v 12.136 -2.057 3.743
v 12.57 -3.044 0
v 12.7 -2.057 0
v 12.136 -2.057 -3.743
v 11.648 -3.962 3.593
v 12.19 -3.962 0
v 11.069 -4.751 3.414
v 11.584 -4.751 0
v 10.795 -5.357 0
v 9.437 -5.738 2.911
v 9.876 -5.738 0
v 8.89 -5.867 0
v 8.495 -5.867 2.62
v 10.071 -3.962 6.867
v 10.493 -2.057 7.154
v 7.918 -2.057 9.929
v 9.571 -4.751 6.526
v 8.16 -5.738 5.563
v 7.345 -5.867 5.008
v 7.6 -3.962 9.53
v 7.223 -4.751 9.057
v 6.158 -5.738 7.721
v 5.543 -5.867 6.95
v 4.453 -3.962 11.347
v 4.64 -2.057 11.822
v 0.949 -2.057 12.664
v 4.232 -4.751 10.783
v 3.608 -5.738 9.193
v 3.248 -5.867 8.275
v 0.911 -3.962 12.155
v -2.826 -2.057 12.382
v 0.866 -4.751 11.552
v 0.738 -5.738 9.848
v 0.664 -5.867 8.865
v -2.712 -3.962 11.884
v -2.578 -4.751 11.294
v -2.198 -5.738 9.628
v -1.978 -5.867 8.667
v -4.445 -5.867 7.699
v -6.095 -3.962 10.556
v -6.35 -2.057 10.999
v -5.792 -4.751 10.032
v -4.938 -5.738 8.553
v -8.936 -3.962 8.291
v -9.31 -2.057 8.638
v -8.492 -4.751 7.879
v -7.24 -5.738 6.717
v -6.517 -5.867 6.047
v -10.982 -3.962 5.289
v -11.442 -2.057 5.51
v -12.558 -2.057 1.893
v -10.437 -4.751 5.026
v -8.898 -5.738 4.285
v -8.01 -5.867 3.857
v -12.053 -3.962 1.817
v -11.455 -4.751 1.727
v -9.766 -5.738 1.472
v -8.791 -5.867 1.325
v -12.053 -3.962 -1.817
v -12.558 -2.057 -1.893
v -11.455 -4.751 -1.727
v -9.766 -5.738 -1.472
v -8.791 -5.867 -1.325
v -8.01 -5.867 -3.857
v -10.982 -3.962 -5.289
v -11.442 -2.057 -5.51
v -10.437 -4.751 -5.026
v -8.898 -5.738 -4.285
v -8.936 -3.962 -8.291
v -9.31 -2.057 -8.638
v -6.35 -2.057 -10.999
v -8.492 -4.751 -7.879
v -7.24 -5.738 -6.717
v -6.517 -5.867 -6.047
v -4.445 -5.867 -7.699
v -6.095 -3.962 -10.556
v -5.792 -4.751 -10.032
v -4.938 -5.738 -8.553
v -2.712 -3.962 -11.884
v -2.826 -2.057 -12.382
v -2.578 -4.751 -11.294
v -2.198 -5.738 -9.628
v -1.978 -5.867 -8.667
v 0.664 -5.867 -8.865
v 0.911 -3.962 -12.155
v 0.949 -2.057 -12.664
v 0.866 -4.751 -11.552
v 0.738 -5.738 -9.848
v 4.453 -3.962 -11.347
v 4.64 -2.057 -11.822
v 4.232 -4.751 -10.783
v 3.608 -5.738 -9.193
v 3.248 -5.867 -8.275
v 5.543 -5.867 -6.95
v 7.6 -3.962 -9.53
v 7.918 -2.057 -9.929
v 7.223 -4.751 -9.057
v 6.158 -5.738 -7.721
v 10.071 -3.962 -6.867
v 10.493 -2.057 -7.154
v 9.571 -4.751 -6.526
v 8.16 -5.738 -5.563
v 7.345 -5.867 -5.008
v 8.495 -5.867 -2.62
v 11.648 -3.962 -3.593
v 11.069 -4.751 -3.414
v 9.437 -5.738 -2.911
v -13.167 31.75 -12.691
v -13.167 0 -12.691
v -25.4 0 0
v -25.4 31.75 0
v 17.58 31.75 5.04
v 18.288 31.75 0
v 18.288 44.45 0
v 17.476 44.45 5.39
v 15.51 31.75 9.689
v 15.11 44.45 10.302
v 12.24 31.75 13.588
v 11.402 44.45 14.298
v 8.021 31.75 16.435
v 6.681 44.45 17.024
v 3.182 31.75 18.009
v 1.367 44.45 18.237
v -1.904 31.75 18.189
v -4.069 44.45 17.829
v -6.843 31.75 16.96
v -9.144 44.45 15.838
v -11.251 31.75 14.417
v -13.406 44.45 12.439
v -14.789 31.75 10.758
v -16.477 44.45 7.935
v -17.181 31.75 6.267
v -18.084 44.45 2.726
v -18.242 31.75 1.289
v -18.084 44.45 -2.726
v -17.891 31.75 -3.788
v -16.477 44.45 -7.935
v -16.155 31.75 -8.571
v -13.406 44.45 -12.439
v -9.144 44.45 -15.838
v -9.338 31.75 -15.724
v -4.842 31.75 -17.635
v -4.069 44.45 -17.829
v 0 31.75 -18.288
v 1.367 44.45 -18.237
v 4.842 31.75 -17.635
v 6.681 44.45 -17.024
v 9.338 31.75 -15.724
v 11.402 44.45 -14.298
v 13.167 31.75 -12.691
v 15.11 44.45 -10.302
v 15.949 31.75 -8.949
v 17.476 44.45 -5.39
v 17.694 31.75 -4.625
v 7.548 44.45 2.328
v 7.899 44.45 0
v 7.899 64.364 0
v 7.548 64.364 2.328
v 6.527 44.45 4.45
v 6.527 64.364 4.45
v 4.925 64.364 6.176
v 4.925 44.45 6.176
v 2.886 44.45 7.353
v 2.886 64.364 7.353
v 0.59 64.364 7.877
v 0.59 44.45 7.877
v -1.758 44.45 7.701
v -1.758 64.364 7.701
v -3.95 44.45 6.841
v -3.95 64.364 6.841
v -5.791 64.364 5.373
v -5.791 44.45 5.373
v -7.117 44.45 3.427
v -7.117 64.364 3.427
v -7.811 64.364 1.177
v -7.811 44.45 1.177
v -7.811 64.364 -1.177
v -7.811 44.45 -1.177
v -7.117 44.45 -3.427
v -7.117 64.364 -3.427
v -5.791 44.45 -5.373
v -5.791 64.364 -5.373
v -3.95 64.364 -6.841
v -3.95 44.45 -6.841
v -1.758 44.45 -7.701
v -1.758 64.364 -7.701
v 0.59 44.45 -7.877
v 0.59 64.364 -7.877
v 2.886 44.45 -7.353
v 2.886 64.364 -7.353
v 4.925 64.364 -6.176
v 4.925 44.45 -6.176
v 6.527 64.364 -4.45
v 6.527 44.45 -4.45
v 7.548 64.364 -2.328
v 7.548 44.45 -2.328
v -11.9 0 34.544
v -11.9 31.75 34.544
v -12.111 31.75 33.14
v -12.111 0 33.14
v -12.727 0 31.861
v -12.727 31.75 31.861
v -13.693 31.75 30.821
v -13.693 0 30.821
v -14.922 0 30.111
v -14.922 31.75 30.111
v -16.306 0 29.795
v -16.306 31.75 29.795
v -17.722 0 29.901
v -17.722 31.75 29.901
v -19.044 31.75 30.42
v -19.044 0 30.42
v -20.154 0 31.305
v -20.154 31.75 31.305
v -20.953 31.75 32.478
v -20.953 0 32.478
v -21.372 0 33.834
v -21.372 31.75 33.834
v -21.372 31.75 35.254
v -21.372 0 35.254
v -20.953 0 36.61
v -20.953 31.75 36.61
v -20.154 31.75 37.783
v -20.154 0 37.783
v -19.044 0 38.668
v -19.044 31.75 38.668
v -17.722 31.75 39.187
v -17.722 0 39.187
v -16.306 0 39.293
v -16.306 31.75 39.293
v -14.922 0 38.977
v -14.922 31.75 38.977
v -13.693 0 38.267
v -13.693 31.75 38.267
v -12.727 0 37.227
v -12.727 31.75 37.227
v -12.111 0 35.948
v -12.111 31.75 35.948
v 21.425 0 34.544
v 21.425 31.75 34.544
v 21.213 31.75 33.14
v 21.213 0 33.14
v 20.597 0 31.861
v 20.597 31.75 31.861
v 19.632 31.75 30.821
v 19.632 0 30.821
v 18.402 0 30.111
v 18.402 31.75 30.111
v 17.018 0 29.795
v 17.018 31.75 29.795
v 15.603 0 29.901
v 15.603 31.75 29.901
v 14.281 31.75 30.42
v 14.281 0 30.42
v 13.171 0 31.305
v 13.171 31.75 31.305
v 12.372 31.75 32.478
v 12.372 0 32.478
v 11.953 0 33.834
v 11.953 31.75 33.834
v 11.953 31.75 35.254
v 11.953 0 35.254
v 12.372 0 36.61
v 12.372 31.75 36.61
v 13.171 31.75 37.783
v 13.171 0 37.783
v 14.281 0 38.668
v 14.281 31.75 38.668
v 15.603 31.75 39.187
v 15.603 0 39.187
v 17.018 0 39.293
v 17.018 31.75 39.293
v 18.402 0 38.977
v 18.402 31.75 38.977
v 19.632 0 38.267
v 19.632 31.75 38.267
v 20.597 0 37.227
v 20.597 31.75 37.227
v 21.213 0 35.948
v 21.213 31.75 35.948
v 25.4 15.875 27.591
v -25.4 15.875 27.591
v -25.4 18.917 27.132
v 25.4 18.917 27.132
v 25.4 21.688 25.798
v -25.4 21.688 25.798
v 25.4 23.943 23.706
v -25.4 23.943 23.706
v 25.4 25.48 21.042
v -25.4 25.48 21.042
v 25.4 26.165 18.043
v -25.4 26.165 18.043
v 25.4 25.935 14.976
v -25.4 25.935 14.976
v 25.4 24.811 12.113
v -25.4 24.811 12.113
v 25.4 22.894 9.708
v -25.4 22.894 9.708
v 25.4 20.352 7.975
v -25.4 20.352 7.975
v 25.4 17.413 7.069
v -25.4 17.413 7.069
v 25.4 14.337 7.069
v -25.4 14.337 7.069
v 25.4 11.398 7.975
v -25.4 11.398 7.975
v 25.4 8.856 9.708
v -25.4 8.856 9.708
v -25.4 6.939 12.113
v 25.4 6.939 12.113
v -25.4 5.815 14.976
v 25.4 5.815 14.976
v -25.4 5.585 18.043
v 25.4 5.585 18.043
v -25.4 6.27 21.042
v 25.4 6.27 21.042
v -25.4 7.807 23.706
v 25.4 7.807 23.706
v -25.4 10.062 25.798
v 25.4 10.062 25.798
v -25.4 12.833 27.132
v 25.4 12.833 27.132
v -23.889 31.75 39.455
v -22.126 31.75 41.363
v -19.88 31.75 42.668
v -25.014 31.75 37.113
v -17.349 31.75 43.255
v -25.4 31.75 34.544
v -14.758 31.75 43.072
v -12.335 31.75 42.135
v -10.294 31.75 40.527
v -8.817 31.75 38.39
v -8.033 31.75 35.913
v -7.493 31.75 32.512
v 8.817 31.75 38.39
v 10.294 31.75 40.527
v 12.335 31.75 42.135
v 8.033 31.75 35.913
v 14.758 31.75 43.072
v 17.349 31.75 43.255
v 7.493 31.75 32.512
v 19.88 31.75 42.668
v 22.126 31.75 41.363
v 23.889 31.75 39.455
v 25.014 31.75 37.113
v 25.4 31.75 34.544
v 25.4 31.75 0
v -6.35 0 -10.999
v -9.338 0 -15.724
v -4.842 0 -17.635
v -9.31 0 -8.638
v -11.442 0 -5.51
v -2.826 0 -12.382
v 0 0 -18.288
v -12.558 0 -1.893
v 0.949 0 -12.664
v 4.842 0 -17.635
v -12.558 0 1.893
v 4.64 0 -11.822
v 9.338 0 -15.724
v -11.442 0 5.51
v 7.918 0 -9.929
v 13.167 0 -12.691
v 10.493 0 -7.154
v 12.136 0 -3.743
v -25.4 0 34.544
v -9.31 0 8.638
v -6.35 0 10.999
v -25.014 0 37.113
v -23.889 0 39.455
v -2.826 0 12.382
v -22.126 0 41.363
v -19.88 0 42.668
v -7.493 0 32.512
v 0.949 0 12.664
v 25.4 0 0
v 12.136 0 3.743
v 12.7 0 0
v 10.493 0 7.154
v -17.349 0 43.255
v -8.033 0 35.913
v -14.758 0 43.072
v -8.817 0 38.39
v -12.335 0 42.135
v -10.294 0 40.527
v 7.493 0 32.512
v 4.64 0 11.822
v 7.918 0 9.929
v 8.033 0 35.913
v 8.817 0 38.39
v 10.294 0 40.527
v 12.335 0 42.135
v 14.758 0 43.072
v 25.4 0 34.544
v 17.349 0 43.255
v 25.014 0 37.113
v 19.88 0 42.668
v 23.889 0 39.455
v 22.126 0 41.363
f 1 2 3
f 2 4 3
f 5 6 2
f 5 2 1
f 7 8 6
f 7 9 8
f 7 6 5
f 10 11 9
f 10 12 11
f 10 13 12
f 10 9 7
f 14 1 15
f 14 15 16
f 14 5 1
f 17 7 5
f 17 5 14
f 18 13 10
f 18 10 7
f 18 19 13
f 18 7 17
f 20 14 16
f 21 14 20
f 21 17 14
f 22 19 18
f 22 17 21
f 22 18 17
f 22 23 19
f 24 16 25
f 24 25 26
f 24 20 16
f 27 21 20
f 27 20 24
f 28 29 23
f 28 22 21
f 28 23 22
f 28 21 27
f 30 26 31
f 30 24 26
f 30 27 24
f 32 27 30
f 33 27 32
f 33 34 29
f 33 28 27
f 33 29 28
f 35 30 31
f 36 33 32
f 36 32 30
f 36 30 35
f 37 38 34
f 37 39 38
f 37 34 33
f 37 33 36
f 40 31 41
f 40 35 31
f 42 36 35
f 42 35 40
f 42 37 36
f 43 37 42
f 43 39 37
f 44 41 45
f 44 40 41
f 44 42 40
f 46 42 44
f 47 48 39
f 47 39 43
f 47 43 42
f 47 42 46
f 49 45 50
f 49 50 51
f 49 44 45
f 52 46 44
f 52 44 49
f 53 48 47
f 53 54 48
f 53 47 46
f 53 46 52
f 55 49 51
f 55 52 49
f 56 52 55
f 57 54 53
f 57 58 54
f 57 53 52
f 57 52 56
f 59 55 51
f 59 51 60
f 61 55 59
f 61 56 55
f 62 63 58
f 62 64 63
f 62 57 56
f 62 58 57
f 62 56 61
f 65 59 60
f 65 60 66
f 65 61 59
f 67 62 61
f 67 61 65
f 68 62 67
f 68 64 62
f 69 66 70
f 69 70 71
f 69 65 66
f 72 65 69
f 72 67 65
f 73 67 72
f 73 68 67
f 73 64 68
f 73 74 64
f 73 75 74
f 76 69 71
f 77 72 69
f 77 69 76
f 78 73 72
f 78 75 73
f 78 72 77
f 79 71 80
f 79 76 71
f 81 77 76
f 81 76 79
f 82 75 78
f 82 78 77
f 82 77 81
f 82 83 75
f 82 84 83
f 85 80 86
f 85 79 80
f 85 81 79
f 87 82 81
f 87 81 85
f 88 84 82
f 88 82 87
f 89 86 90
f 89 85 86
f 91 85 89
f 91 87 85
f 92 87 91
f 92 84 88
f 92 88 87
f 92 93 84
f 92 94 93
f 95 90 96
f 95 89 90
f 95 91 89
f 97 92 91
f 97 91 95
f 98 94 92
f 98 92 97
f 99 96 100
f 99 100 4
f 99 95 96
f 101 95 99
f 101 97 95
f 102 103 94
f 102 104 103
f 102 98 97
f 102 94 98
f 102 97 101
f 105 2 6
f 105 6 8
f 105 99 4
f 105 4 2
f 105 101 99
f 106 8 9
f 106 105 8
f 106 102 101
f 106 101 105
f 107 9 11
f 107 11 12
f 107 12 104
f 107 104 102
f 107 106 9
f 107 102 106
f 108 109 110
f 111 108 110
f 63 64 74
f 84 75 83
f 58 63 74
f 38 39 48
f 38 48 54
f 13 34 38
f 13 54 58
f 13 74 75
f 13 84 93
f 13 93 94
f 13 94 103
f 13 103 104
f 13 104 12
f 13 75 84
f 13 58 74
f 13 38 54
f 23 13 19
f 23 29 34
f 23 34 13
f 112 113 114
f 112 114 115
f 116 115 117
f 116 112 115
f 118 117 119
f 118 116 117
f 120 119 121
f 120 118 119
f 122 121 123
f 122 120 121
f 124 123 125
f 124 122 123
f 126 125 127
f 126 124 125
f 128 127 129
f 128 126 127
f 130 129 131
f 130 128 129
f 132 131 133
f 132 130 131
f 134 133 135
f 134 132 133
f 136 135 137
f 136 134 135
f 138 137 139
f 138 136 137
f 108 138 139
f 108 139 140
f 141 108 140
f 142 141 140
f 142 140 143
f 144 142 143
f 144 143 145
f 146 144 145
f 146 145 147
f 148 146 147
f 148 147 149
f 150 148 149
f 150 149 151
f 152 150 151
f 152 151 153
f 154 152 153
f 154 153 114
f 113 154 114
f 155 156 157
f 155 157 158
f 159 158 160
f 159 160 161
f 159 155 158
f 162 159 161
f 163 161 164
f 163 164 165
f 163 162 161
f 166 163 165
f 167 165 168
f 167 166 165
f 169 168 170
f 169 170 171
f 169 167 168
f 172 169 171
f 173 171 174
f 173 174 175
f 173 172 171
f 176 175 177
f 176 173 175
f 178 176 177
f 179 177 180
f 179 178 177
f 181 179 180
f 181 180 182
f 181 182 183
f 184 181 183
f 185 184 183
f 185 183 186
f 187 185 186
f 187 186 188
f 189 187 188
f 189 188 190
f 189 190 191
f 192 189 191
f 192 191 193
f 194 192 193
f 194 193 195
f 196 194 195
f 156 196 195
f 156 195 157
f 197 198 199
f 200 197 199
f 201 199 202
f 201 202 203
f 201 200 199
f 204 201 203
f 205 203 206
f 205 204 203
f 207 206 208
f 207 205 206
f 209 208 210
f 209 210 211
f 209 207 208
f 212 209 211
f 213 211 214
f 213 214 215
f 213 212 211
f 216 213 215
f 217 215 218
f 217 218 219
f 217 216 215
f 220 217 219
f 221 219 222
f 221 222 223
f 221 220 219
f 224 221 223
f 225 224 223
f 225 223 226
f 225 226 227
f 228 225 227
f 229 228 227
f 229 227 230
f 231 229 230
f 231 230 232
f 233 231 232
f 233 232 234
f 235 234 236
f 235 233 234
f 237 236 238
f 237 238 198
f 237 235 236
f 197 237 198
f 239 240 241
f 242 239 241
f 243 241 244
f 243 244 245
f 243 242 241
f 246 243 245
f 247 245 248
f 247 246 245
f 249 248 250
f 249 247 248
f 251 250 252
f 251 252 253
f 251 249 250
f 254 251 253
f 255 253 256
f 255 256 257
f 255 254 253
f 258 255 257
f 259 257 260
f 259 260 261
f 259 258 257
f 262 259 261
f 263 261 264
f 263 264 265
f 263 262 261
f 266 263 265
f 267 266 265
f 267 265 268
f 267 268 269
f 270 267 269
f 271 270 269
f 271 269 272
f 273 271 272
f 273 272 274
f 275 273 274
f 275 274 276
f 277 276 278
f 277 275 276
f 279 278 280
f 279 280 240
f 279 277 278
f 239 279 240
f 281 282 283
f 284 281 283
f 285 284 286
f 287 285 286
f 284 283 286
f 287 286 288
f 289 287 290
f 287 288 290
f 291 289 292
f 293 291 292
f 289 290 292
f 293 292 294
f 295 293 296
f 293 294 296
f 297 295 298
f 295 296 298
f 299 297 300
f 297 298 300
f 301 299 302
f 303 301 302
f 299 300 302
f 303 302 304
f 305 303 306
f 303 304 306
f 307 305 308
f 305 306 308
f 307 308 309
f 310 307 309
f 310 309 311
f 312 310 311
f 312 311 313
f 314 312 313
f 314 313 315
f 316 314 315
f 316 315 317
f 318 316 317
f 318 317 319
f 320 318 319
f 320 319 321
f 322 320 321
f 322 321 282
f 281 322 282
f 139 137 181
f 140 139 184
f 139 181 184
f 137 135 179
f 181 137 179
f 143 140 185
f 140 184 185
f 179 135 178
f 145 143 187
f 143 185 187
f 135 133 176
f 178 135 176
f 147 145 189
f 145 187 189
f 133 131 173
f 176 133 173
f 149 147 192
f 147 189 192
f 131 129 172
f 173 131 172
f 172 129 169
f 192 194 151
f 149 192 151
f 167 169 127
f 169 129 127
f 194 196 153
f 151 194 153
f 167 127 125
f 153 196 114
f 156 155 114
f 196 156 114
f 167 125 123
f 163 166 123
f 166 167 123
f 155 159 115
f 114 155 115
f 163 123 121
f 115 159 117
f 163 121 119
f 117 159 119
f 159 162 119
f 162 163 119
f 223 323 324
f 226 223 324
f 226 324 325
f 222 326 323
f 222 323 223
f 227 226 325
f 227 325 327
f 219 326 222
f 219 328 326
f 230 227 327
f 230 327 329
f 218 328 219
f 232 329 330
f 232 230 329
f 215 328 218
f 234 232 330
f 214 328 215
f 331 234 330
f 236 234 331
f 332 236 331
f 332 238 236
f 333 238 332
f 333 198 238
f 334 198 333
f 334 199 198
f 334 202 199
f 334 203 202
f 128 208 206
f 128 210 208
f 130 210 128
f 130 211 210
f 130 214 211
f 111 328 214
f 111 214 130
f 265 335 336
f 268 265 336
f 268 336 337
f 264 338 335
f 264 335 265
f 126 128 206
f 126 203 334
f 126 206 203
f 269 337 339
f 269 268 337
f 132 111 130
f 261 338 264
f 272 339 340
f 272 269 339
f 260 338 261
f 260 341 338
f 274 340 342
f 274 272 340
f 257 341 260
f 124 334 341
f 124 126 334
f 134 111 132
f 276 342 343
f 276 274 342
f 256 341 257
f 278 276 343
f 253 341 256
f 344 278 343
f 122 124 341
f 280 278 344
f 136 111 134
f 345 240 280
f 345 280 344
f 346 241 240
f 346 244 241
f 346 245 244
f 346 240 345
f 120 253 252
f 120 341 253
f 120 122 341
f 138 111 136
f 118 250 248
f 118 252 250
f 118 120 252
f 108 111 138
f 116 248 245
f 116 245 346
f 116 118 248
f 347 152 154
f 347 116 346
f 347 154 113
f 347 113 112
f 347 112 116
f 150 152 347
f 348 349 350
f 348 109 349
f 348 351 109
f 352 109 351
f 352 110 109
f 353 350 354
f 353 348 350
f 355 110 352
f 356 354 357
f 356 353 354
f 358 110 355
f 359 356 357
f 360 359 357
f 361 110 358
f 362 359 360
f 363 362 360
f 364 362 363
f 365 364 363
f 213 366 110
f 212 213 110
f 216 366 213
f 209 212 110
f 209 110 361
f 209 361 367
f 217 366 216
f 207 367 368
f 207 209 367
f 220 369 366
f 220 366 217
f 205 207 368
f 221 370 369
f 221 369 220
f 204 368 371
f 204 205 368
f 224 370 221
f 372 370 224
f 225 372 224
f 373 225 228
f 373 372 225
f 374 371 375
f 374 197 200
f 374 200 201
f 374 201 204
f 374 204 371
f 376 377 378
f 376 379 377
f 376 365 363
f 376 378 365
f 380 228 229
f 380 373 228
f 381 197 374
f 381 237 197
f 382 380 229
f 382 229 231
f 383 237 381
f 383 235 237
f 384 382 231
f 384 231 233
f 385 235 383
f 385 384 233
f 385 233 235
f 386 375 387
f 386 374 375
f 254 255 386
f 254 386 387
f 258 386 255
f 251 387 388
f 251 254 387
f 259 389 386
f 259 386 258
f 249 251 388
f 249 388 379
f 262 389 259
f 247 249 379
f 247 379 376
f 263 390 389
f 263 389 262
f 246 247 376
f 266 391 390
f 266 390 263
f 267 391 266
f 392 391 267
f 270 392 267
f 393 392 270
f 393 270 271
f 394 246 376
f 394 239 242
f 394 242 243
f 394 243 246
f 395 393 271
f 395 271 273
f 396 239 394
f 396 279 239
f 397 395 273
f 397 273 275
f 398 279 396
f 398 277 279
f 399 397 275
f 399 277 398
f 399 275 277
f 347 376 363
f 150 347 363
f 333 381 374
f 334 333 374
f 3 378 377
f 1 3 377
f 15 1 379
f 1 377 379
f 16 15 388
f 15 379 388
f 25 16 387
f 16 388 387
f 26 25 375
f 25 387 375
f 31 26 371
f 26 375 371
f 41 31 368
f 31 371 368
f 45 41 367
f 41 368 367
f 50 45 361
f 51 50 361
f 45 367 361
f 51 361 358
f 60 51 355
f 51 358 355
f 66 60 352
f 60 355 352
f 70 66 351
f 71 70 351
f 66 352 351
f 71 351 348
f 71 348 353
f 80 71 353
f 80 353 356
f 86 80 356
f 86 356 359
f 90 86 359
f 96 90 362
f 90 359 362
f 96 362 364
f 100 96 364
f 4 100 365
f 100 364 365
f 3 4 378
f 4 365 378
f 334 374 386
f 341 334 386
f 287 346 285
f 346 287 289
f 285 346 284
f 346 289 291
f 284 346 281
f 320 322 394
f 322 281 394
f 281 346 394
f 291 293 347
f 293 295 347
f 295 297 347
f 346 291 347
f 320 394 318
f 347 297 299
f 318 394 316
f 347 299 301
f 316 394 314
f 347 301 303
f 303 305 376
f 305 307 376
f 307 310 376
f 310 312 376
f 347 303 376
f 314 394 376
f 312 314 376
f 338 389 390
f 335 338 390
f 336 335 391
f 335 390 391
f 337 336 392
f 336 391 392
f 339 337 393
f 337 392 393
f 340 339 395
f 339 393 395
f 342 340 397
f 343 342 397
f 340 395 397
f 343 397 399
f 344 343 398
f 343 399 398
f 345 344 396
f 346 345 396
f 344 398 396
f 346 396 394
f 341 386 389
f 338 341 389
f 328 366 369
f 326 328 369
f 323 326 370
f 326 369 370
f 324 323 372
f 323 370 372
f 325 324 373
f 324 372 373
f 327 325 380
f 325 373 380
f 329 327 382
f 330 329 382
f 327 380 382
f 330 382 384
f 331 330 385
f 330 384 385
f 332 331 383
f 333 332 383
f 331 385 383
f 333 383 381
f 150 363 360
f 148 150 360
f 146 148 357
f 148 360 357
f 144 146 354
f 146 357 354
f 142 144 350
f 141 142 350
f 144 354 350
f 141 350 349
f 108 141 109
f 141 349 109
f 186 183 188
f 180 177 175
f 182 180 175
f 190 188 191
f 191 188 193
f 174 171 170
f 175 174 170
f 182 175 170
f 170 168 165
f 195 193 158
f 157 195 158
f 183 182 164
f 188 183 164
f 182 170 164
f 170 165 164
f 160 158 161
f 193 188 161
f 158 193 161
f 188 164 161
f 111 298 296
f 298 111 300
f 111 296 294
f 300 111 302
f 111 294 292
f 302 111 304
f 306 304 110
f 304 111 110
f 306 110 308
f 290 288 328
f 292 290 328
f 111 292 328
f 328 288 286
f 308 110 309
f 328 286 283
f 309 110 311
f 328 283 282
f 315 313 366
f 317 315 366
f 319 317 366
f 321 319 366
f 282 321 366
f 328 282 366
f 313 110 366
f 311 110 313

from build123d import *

# Parameters (mm, degrees)
SKETCH1_R              = 4.7625
BODY_DEPTH             = 31.75
SKETCH3_R              = 18.288
PINION_CARRIER_DEPTH   = 44.45
SKETCH4_R              = 7.8994
PINION_DEPTH           = 64.3636
SKETCH5_R              = 12.7
PINION_BOTTOM_DEPTH    = 5.8674
PINION_BOTTOM_FILLET_R = 3.81
SKETCH2_R              = 10.31875
RACK_HOLE_DEPTH        = 51.8


with BuildPart() as part:
    # Sketch1 → Body (new body)
    with BuildSketch(Plane(origin=(0, 0, 0), x_dir=(1, 0, 0), z_dir=(0, 1, 0))):
        with BuildLine():
            Line((-7.493, -32.512), (7.493, -32.512))
            Line((7.493, -32.512), (8.032785528, -35.913455304))
            ThreePointArc((8.032785528, -35.913455304), (17.349253096, -43.254561784), (25.4, -34.544))
            Line((25.4, -34.544), (25.4, 0))
            Line((25.4, 0), (13.16736, 12.691397663))
            ThreePointArc((13.16736, 12.691397663), (0, 18.288), (-13.16736, 12.691397663))
            Line((-13.16736, 12.691397663), (-25.4, 0))
            Line((-25.4, 0), (-25.4, -34.544))
            ThreePointArc((-25.4, -34.544), (-17.349253096, -43.254561784), (-8.032785528, -35.913455304))
            Line((-8.032785528, -35.913455304), (-7.493, -32.512))
        make_face()
        with Locations((16.6624, -34.544)):
            Circle(SKETCH1_R, mode=Mode.SUBTRACT)
        with Locations((-16.6624, -34.544)):
            Circle(SKETCH1_R, mode=Mode.SUBTRACT)
    extrude(amount=BODY_DEPTH)

    # Sketch3 → Pinion Carrier (add)
    with BuildSketch(Plane.XZ):
        Circle(SKETCH3_R)
    extrude(amount=-PINION_CARRIER_DEPTH)

    # Sketch4 → Pinion (add)
    with BuildSketch(Plane.XZ):
        Circle(SKETCH4_R)
    extrude(amount=-PINION_DEPTH)

    # Sketch5 → Pinion Bottom (add)
    with BuildSketch(Plane.XZ):
        Circle(SKETCH5_R)
    extrude(amount=PINION_BOTTOM_DEPTH)

    # Pinion Bottom Fillet
    pinion_bottom_fillet_edges = [part.edges().sort_by_distance(p)[0] for p in [
        (-12.7, -5.8674, 0),
    ]]
    fillet(pinion_bottom_fillet_edges, radius=PINION_BOTTOM_FILLET_R)

    # Sketch2 → Rack Hole (cut, through all)
    with BuildSketch(Plane.ZY.offset(25.4)):
        with Locations((17.272, 15.875)):
            Circle(SKETCH2_R)
    extrude(amount=-RACK_HOLE_DEPTH, mode=Mode.SUBTRACT)


solid = part.part
